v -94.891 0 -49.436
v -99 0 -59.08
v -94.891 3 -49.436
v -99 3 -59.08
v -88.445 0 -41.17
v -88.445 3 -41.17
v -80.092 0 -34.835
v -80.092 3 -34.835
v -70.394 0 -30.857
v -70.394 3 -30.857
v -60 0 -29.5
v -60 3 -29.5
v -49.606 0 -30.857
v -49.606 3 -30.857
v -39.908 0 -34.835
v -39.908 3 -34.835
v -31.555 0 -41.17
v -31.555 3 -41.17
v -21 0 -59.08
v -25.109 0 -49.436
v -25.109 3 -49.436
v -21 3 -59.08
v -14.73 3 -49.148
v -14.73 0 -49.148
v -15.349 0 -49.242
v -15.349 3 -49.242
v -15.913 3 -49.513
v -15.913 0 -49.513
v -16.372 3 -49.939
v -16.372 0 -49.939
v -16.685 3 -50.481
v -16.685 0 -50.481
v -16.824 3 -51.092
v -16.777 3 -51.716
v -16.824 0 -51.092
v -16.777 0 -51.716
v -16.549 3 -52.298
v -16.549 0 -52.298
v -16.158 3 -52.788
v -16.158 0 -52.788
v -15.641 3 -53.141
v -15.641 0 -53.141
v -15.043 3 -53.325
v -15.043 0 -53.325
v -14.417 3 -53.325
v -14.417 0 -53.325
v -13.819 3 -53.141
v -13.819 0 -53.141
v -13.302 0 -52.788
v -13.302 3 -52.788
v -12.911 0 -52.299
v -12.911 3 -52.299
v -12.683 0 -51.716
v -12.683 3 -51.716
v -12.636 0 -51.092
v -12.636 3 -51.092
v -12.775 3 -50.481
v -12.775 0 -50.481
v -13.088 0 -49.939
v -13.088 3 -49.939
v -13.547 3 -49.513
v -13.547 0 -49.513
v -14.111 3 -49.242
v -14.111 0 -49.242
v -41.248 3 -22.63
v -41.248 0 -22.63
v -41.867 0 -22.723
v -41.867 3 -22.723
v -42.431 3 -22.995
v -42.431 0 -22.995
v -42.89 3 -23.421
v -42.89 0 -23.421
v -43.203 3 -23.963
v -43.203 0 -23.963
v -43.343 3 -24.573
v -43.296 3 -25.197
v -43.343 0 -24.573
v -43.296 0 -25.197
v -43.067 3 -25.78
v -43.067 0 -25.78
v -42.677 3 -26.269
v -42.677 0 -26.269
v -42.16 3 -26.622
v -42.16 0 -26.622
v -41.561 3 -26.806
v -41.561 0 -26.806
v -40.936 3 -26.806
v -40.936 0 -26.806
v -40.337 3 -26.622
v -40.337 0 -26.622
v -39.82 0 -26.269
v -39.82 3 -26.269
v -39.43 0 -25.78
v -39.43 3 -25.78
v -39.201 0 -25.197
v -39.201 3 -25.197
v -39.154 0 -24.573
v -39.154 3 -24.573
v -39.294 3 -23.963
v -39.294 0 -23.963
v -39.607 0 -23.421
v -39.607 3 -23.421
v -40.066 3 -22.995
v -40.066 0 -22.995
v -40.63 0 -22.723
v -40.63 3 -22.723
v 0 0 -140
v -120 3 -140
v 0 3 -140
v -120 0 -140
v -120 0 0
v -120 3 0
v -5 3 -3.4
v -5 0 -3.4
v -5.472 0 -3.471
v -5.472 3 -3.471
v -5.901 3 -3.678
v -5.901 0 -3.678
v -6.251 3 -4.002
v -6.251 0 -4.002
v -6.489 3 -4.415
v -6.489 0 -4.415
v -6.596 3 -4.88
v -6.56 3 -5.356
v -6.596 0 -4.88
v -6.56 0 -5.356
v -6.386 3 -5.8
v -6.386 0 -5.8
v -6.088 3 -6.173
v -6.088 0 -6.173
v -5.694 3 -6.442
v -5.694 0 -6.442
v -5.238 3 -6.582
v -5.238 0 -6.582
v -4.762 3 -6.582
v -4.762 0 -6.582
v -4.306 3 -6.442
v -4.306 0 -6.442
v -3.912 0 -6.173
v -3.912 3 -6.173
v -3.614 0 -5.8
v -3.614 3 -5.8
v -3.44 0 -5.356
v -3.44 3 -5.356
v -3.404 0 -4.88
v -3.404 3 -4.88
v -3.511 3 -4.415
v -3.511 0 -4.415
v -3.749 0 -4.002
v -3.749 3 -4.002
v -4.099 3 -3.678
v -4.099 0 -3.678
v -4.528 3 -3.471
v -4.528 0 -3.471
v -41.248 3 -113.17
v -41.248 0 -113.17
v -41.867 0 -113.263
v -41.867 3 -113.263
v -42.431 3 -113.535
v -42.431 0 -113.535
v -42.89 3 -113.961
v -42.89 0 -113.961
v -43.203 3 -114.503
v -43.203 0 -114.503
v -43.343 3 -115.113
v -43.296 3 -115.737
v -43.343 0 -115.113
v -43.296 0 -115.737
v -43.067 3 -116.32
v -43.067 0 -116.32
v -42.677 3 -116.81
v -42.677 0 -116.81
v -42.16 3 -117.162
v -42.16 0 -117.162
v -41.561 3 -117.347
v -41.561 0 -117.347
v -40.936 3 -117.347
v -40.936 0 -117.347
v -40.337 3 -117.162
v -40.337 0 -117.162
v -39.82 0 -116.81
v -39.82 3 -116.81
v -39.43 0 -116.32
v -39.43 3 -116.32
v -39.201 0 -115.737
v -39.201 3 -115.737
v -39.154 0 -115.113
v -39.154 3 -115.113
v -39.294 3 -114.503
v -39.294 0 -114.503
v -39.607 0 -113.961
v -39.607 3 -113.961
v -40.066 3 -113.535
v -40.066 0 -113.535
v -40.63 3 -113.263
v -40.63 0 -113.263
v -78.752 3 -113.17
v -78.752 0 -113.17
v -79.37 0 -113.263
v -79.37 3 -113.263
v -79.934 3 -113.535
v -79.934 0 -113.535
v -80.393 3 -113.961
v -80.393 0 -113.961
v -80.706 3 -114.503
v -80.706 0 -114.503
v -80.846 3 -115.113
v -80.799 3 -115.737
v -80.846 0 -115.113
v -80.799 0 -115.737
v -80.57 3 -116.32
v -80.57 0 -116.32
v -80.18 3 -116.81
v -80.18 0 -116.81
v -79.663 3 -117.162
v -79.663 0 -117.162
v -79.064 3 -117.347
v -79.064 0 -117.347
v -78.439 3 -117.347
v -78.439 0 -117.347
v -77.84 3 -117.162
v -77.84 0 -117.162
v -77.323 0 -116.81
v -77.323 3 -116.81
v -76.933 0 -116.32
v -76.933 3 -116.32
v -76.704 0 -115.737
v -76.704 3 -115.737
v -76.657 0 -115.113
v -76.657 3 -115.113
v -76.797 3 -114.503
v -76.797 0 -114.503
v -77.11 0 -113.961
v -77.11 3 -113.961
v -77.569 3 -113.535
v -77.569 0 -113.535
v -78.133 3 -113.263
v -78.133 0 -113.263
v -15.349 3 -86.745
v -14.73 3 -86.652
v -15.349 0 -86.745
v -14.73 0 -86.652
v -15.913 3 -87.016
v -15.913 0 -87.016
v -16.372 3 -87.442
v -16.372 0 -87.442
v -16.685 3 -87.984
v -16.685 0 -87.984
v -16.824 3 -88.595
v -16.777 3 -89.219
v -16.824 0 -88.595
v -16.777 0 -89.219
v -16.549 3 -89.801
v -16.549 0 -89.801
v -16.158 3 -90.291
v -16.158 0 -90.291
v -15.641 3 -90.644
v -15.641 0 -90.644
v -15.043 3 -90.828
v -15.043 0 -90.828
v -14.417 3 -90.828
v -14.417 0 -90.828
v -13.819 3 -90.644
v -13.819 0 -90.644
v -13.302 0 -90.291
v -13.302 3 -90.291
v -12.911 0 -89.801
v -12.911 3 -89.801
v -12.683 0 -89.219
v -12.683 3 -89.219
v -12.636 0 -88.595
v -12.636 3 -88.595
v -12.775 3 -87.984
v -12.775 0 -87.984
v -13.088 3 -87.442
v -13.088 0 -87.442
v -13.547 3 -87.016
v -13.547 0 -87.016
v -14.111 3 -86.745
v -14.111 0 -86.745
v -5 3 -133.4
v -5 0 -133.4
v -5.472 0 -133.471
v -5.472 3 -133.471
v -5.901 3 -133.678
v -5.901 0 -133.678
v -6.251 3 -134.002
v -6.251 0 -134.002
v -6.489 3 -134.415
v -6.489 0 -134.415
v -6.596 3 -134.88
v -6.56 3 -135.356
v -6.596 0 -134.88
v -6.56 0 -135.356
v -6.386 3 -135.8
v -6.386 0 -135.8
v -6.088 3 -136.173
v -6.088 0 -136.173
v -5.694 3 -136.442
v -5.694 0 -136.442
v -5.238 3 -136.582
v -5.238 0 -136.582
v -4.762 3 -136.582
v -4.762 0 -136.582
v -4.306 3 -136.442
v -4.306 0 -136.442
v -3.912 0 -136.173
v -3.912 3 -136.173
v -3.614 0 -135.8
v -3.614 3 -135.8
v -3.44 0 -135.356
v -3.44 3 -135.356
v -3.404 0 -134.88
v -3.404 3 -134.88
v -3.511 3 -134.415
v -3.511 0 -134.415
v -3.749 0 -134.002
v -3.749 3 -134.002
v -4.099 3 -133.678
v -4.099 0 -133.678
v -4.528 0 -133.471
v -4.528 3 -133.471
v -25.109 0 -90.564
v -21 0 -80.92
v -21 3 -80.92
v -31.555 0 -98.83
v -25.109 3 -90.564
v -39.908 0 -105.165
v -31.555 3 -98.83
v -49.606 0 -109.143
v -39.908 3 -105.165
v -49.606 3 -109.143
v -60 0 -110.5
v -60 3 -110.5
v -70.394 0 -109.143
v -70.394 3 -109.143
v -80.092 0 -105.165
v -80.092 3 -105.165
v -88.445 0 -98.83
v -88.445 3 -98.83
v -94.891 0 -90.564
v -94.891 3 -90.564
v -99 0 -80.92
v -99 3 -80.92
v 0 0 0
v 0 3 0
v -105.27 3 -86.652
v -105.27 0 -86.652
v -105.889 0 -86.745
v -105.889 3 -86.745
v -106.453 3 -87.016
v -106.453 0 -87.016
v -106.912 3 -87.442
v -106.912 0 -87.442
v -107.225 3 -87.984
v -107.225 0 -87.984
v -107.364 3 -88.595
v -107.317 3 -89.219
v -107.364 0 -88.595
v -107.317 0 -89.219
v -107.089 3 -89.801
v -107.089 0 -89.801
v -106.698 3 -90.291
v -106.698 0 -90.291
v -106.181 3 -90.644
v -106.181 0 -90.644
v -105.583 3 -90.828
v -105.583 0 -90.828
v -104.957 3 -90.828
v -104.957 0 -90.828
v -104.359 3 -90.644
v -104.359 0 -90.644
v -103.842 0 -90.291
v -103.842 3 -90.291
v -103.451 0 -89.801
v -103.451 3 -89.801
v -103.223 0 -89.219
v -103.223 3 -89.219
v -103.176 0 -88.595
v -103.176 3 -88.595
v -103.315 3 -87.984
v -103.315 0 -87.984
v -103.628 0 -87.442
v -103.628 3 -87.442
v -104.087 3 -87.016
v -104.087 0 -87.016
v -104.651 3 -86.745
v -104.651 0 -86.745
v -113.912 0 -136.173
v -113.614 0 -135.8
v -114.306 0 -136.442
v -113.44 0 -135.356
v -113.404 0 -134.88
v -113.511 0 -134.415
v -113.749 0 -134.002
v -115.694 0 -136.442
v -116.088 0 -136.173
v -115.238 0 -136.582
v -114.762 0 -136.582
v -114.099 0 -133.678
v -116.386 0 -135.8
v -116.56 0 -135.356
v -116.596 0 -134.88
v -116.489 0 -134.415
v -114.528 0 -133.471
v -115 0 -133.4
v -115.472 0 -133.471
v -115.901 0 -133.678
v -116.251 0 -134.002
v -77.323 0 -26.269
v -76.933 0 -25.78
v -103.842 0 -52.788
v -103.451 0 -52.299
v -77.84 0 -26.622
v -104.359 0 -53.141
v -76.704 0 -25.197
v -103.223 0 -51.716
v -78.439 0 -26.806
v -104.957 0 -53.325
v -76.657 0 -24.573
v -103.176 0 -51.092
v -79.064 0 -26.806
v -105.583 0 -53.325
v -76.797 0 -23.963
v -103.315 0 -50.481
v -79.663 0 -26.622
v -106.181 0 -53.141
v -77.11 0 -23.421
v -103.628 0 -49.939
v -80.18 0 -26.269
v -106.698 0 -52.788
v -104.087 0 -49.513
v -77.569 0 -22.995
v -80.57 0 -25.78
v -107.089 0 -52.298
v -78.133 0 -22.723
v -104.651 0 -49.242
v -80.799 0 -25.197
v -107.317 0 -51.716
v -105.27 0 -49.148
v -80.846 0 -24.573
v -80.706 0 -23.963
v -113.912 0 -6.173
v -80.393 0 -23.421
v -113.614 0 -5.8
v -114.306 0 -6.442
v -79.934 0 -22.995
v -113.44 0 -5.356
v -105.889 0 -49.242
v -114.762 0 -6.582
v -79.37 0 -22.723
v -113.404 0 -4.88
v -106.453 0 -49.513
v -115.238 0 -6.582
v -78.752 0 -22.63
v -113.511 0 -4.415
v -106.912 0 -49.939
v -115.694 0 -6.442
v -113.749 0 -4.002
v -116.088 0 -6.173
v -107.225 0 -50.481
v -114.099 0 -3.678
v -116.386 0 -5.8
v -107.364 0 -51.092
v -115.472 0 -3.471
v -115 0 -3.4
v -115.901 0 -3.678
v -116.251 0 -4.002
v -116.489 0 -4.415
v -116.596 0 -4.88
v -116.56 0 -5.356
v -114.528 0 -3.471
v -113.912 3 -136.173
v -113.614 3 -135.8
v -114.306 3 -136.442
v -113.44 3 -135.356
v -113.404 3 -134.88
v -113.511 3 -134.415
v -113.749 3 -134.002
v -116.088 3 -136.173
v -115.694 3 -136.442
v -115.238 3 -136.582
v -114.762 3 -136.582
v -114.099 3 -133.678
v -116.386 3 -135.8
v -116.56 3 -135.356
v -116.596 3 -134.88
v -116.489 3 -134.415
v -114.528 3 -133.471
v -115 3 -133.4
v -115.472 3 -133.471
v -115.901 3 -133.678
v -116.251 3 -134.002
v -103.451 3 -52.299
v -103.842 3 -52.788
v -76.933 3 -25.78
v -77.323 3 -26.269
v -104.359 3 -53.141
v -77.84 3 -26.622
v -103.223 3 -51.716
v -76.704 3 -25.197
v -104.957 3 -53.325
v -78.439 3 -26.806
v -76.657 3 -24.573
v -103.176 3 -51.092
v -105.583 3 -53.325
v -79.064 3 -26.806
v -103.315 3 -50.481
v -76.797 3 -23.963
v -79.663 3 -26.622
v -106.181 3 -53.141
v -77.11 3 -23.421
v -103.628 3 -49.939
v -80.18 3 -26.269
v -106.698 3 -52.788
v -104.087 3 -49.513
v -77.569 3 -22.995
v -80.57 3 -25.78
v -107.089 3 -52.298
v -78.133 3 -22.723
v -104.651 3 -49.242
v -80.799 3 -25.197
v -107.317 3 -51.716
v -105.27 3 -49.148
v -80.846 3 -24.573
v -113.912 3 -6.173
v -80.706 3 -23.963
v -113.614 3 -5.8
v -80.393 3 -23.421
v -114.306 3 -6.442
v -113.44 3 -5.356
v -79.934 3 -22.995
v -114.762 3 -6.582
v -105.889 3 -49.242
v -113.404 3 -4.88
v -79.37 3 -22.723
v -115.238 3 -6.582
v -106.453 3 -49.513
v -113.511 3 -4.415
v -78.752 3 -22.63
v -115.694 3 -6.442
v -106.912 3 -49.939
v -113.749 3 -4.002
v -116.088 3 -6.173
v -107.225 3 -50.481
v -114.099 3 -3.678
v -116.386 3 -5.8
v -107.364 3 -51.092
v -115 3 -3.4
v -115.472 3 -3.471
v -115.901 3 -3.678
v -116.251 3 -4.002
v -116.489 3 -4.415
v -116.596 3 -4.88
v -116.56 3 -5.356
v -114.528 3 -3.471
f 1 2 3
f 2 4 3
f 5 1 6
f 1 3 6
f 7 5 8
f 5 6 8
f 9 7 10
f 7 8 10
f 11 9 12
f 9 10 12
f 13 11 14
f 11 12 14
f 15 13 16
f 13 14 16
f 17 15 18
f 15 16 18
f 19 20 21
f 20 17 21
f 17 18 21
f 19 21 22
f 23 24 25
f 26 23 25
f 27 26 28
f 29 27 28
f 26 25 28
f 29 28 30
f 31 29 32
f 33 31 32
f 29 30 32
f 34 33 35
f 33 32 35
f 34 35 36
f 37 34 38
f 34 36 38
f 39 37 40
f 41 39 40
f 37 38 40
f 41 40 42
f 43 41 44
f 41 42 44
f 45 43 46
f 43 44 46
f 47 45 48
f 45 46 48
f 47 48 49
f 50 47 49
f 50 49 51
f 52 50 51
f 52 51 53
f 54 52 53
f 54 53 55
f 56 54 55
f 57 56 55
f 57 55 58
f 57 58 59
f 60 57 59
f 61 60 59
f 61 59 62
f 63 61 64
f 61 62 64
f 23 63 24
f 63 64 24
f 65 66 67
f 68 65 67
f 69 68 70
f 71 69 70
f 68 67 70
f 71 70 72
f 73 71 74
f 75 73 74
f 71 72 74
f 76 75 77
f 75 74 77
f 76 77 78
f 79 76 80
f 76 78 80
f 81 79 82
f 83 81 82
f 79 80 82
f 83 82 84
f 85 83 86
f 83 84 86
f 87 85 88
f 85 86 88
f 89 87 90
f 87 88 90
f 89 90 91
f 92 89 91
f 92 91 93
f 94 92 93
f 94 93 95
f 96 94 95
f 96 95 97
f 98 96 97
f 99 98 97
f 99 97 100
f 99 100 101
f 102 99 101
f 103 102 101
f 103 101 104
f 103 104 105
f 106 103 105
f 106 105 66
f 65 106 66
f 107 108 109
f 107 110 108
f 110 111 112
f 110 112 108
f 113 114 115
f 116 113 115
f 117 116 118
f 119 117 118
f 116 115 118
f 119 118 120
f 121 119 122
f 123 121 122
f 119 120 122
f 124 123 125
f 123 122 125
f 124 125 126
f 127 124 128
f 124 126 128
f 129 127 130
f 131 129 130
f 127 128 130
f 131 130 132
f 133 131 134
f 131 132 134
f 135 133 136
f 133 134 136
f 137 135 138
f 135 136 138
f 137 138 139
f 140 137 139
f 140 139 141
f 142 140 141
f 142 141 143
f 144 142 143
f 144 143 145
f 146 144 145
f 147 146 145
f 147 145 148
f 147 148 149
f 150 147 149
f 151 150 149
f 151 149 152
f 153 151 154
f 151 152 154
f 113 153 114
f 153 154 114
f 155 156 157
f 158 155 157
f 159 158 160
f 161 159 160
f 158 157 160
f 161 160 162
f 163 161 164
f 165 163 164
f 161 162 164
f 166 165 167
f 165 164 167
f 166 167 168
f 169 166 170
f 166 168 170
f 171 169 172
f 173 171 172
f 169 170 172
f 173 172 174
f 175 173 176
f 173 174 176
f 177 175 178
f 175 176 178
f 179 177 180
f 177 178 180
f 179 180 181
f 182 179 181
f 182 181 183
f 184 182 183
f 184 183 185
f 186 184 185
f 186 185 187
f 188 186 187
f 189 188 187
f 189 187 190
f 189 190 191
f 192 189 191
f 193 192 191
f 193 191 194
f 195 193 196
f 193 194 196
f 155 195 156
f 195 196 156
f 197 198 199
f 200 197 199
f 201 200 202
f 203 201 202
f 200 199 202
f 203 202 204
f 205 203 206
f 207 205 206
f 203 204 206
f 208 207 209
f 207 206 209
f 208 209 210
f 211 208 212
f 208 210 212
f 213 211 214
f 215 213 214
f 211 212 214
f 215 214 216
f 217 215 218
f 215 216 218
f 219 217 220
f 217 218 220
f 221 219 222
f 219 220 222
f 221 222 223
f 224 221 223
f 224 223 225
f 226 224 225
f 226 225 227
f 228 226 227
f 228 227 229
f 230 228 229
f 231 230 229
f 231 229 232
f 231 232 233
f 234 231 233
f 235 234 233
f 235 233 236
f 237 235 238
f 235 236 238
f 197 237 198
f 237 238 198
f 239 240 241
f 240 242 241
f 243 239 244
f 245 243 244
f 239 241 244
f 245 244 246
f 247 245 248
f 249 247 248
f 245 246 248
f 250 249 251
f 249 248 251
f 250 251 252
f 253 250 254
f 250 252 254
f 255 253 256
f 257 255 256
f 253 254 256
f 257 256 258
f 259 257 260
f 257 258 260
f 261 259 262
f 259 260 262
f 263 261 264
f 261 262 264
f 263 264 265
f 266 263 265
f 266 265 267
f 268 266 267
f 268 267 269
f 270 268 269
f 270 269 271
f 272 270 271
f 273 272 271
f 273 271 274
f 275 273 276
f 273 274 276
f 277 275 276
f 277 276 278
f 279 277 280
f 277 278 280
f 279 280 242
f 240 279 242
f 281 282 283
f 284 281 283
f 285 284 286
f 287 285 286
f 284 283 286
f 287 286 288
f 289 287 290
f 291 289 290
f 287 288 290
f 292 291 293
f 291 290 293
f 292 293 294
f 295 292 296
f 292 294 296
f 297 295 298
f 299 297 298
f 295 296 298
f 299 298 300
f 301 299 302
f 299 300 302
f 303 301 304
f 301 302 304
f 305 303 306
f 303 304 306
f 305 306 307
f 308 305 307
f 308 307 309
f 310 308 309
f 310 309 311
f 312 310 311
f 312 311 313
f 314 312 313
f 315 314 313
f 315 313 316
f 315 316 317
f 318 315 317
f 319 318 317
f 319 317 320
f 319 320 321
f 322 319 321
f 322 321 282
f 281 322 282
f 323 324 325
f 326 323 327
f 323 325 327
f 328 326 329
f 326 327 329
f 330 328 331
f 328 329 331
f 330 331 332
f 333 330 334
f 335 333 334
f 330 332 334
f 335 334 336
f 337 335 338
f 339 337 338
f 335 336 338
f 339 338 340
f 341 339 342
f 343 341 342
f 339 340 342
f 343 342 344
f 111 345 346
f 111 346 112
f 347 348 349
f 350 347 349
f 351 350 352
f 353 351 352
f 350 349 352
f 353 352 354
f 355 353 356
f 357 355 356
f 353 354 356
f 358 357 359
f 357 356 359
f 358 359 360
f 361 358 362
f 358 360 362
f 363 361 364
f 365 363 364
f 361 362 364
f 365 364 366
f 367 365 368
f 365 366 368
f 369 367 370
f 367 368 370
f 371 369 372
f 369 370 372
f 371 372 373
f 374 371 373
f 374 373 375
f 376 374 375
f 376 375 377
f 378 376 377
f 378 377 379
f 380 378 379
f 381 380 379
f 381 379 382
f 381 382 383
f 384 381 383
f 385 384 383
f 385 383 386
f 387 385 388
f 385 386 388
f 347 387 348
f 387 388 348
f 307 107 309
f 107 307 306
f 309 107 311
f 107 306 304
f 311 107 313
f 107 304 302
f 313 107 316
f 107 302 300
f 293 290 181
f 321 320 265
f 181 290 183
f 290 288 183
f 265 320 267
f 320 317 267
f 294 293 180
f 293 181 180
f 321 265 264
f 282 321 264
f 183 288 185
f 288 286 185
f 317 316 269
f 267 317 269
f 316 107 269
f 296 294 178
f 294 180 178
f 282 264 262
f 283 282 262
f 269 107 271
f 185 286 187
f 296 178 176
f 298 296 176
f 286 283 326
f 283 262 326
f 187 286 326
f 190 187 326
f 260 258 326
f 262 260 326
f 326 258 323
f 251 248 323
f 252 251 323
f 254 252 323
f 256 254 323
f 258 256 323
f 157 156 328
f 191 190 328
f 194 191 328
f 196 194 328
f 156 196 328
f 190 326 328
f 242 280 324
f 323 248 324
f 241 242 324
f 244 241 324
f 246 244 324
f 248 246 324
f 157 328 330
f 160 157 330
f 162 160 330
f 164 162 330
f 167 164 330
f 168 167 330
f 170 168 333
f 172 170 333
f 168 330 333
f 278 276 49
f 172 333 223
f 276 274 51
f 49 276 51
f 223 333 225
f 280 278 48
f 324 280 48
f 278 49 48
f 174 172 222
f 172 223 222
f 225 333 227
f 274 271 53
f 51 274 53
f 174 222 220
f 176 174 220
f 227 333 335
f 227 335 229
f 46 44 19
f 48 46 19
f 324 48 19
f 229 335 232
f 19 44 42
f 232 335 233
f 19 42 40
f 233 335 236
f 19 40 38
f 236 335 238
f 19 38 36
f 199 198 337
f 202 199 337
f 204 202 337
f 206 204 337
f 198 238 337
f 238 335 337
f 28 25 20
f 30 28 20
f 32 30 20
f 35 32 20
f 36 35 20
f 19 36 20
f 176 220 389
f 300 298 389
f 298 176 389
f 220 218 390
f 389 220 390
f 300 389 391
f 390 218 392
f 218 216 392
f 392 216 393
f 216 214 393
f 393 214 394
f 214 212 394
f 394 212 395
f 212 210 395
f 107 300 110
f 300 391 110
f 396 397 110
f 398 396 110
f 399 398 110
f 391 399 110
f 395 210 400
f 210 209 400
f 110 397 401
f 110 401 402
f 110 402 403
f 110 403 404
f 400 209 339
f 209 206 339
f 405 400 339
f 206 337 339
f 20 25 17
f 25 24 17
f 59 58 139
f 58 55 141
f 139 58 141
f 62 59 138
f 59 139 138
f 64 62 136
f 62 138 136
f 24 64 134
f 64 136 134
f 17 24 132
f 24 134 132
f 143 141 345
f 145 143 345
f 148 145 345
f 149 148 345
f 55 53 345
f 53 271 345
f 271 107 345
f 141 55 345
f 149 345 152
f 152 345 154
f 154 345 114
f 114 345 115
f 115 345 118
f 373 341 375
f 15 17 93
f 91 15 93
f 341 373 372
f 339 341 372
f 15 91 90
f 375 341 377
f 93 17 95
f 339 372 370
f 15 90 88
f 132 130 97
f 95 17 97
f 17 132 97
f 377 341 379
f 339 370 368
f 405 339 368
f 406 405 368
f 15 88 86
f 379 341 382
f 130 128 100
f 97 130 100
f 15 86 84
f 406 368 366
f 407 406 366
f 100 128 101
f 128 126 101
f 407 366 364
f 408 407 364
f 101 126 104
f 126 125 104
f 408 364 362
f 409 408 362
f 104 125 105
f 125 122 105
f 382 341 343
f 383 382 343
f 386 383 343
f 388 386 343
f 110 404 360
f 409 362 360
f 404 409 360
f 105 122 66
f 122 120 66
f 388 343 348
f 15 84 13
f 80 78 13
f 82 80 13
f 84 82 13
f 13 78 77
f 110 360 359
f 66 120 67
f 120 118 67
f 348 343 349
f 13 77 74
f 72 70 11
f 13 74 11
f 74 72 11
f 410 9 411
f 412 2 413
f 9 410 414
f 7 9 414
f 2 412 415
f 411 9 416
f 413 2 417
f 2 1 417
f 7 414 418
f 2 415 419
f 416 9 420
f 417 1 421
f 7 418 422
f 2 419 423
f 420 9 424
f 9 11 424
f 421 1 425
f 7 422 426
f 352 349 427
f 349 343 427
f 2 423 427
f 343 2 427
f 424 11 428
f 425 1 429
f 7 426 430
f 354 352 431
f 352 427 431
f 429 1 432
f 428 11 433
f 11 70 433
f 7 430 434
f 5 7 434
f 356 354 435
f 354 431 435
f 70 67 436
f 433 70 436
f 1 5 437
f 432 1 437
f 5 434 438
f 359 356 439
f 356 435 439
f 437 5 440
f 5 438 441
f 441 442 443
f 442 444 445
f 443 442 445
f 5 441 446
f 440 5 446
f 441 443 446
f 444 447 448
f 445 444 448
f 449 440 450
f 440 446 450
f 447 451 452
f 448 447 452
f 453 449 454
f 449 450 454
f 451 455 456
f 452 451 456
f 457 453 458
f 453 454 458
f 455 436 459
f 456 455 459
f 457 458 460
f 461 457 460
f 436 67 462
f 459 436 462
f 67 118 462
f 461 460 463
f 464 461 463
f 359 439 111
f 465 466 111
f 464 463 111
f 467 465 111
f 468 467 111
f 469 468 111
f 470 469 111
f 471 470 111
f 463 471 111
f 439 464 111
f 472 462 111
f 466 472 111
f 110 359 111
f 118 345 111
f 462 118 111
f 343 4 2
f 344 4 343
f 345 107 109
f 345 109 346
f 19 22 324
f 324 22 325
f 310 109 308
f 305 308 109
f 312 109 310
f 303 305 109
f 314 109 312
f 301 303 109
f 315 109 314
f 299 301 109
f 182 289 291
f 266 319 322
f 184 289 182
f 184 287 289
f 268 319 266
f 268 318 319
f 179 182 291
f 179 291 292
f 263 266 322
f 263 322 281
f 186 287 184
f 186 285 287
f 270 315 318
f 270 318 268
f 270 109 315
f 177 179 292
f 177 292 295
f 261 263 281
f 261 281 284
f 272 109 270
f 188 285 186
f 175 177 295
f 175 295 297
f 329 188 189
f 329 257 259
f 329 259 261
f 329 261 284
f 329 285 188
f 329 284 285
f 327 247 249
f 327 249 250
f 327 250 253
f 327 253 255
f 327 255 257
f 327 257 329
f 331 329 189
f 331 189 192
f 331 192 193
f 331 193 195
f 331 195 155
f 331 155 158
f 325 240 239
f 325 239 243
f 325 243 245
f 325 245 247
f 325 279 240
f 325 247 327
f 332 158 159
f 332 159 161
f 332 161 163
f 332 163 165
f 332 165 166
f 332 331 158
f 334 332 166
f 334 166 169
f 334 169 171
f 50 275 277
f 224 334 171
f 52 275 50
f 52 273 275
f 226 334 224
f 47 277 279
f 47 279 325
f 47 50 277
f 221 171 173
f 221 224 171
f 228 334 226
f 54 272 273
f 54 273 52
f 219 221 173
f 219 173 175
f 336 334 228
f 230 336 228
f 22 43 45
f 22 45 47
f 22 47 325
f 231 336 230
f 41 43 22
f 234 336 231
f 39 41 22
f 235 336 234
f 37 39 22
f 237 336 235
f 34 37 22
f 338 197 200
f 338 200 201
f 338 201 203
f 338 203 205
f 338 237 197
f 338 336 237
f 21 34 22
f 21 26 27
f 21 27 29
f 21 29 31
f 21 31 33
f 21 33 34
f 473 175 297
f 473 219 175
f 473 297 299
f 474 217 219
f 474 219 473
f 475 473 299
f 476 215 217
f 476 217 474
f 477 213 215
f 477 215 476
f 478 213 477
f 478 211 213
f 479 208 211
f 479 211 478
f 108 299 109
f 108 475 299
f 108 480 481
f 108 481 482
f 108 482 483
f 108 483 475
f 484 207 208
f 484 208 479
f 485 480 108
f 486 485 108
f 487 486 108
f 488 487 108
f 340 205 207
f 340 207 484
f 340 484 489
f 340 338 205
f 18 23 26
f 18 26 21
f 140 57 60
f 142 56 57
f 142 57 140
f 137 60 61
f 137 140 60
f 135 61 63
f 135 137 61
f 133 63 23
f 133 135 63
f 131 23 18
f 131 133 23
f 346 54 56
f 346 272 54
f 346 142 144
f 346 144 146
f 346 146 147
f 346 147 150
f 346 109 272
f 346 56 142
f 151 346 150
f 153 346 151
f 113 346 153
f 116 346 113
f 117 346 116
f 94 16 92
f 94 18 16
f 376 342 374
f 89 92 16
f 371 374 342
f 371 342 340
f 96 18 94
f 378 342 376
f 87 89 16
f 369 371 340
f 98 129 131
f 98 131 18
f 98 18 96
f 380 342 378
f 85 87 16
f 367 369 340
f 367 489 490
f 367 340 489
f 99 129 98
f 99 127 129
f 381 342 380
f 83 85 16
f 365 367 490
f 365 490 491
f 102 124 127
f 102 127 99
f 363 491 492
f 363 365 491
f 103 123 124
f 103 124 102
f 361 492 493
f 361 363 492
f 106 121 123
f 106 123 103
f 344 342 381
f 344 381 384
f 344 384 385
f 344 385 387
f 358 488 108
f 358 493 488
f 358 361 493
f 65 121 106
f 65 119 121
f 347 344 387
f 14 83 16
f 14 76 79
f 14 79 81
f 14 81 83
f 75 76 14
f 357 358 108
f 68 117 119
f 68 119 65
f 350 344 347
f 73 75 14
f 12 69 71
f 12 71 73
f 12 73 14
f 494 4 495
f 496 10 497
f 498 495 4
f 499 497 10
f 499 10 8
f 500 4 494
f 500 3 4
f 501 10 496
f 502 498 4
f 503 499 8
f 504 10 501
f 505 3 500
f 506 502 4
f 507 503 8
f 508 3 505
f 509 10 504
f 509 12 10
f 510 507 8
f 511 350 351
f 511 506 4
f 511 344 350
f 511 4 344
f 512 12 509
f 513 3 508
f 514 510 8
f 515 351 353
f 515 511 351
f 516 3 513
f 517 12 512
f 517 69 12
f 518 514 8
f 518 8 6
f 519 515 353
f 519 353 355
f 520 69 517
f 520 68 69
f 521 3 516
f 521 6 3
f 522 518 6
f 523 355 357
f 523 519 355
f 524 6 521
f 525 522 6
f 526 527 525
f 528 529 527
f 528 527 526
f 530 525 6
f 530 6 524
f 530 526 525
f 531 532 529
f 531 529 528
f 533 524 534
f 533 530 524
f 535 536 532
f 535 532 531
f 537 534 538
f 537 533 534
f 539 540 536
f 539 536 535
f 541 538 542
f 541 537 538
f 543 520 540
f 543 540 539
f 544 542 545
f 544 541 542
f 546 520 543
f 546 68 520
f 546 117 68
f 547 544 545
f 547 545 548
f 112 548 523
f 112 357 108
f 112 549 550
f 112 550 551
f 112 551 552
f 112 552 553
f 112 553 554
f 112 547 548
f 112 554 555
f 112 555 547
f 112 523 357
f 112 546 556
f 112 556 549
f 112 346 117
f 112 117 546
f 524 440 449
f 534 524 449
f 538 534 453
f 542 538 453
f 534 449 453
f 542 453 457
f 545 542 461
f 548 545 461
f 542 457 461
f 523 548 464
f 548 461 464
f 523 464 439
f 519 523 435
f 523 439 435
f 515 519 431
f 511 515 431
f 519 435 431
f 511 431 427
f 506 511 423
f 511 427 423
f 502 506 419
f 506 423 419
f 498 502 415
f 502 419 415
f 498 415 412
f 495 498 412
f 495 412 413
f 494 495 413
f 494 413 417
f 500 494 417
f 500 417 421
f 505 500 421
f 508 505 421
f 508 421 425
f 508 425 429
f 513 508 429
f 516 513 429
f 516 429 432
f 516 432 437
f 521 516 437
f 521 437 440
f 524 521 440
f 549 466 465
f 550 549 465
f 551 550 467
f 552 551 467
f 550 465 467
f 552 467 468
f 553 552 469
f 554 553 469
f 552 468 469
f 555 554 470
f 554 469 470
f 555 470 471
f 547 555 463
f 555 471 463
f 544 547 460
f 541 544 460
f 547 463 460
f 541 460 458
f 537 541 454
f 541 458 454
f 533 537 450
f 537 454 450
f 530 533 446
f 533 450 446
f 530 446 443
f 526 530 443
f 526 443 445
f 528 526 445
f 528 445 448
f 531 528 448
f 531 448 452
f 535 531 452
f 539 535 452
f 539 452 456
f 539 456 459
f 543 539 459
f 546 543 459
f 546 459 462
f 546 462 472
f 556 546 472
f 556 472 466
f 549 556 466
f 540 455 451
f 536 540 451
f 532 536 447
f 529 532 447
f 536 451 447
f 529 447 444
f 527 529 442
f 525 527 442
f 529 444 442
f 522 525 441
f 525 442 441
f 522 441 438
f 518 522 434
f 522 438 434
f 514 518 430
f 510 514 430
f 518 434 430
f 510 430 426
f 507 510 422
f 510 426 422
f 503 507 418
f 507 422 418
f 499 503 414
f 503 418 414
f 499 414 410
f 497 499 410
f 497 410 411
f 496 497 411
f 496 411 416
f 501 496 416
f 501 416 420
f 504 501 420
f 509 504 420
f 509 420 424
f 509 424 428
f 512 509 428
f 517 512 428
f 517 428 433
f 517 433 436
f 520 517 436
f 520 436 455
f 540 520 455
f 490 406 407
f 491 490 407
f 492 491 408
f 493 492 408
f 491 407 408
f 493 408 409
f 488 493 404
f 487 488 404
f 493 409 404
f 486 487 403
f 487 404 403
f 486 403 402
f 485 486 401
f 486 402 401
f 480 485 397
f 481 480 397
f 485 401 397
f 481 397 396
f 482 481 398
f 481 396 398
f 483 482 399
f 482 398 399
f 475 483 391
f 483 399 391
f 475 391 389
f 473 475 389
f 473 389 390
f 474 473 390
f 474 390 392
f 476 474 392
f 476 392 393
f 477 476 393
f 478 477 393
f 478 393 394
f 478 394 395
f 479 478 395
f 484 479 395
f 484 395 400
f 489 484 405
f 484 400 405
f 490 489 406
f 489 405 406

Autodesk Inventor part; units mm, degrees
ref_plane "YZ Plane" through (0, 0, 0) normal (1, 0, 0) x (0, 1, 0)
ref_plane "XZ Plane" through (0, 0, 0) normal (0, 1, 0) x (-1, 0, 0)
ref_plane "XY Plane" through (0, 0, 0) normal (0, 0, 1) x (1, 0, 0)
sketch "スケッチ1" plane through (0, 0, 0) normal (0, 1, 0) x (-1, 0, 0)
  line L0 (0, 0) -> (120, 0)
  line L1 (120, 0) -> (120, -140)
  line L2 (120, -140) -> (0, -140)
  line L3 (0, -140) -> (0, 0)
  dimension "d0" = 120
  dimension "d1" = 140
extrude "押し出し1" add sketch "スケッチ1" along normal blind 3
sketch "スケッチ2" plane through (0, 3, 0) normal (0, 1, 0) x (1, 0, 0)
  line L0 (-120, 140) -> (-120, 0) projected
  line L1 (0, 140) -> (-120, 140) projected
  line L2 (-120, 0) -> (0, 140)
  circle A0 centre (-60, 70) radius 49
  line L3 (-120, 70) -> (0, 70)
  line L4 (0, 0) -> (0, 140) projected
  line L5 (-60, 70) -> (-14.7299, 88.7515)
  point P0 (-41.2485, 115.2701)
  point P1 (-78.7515, 115.2701)
  point P2 (-105.2701, 88.7515)
  point P3 (-105.2701, 51.2485)
  point P4 (-78.7515, 24.7299)
  point P5 (-41.2485, 24.7299)
  point P6 (-14.7299, 51.2485)
  dimension "d4" = 98
  dimension "d5" = 22.5
  dimension "d8" = 360
hole "穴1" at (-14.7299, 3, -88.7515) at (-41.2485, 3, -115.2701) at (-78.7515, 3, -115.2701) at (-105.2701, 3, -88.7515) at (-105.2701, 3, -51.2485) at (-78.7515, 3, -24.7299) at (-41.2485, 3, -24.7299) at (-14.7299, 3, -51.2485) direction (0, -1, 0) diameter 4.2 end through all
sketch "スケッチ3" plane through (0, 3, 0) normal (0, 1, 0) x (1, 0, 0)
  line L0 (-120, 140) -> (-120, 0) projected
  line L1 (0, 140) -> (-120, 140) projected
  line L2 (-120, 0) -> (0, 140)
  circle A0 centre (-60, 70) radius 40.5
  line L3 (-120, 0) -> (0, 0) projected
  line L4 (-99, 0) -> (-99, 140)
  line L5 (-21, 0) -> (-21, 140)
  point P0 (-21, 70)
  point P1 (-99, 80.9202)
  point P2 (-99, 59.0798)
  point P3 (-21, 59.0798)
  point P4 (-21, 80.9202)
  dimension "d17" = 81
  dimension "d20" = 39
  dimension "d21" = 39
extrude "押し出し2" cut sketch "スケッチ3" against normal blind 3 contours A0 L2 L4 | L2 A0 L5 picked at (-76.2281, 82.7678) picked at (-47.1316, 53.0288)
sketch "スケッチ4" plane through (0, 3, 0) normal (0, 1, 0) x (1, 0, 0)
  line L0 (-120, 140) -> (-120, 0) projected
  line L1 (-120, 5) -> (0, 5)
  line L2 (0, 0) -> (0, 140) projected
  line L3 (-120, 135) -> (0, 135)
  line L4 (-120, 0) -> (0, 0) projected
  line L5 (0, 140) -> (-120, 140) projected
  line L6 (-120, 0) -> (0, 0) projected
  line L7 (-115, 0) -> (-115, 140)
  line L8 (-5, 140) -> (-5, 0)
  point P0 (-115, 5)
  point P1 (-5, 5)
  point P2 (-5, 135)
  point P3 (-115, 135)
  dimension "d22" = 5
  dimension "d23" = 5
  dimension "d24" = 5
  dimension "d25" = 5
hole "穴2" at (-115, 3, -5) at (-5, 3, -5) at (-5, 3, -135) at (-115, 3, -135) direction (0, -1, 0) diameter 3.2 end through all
equation "\"d15\" = Thickness"
equation "\"BendRadius\" = Thickness"
equation "\"BendReliefWidth\" = Thickness"
equation "\"BendReliefDepth\" = 0.5 * Thickness"
equation "\"CornerReliefSize\" = 4 * Thickness"
equation "\"MinimumRemnant\" = 2 * Thickness"
equation "\"TransitionRadius\" = BendRadius"
equation "\"JacobiRadiusSize\" = BendRadius"
equation "\"GapSize\" = Thickness"
equation "\"Thickness\" = 0.5"
properties part number "base_plate2" material "アルミニウム 6061"
